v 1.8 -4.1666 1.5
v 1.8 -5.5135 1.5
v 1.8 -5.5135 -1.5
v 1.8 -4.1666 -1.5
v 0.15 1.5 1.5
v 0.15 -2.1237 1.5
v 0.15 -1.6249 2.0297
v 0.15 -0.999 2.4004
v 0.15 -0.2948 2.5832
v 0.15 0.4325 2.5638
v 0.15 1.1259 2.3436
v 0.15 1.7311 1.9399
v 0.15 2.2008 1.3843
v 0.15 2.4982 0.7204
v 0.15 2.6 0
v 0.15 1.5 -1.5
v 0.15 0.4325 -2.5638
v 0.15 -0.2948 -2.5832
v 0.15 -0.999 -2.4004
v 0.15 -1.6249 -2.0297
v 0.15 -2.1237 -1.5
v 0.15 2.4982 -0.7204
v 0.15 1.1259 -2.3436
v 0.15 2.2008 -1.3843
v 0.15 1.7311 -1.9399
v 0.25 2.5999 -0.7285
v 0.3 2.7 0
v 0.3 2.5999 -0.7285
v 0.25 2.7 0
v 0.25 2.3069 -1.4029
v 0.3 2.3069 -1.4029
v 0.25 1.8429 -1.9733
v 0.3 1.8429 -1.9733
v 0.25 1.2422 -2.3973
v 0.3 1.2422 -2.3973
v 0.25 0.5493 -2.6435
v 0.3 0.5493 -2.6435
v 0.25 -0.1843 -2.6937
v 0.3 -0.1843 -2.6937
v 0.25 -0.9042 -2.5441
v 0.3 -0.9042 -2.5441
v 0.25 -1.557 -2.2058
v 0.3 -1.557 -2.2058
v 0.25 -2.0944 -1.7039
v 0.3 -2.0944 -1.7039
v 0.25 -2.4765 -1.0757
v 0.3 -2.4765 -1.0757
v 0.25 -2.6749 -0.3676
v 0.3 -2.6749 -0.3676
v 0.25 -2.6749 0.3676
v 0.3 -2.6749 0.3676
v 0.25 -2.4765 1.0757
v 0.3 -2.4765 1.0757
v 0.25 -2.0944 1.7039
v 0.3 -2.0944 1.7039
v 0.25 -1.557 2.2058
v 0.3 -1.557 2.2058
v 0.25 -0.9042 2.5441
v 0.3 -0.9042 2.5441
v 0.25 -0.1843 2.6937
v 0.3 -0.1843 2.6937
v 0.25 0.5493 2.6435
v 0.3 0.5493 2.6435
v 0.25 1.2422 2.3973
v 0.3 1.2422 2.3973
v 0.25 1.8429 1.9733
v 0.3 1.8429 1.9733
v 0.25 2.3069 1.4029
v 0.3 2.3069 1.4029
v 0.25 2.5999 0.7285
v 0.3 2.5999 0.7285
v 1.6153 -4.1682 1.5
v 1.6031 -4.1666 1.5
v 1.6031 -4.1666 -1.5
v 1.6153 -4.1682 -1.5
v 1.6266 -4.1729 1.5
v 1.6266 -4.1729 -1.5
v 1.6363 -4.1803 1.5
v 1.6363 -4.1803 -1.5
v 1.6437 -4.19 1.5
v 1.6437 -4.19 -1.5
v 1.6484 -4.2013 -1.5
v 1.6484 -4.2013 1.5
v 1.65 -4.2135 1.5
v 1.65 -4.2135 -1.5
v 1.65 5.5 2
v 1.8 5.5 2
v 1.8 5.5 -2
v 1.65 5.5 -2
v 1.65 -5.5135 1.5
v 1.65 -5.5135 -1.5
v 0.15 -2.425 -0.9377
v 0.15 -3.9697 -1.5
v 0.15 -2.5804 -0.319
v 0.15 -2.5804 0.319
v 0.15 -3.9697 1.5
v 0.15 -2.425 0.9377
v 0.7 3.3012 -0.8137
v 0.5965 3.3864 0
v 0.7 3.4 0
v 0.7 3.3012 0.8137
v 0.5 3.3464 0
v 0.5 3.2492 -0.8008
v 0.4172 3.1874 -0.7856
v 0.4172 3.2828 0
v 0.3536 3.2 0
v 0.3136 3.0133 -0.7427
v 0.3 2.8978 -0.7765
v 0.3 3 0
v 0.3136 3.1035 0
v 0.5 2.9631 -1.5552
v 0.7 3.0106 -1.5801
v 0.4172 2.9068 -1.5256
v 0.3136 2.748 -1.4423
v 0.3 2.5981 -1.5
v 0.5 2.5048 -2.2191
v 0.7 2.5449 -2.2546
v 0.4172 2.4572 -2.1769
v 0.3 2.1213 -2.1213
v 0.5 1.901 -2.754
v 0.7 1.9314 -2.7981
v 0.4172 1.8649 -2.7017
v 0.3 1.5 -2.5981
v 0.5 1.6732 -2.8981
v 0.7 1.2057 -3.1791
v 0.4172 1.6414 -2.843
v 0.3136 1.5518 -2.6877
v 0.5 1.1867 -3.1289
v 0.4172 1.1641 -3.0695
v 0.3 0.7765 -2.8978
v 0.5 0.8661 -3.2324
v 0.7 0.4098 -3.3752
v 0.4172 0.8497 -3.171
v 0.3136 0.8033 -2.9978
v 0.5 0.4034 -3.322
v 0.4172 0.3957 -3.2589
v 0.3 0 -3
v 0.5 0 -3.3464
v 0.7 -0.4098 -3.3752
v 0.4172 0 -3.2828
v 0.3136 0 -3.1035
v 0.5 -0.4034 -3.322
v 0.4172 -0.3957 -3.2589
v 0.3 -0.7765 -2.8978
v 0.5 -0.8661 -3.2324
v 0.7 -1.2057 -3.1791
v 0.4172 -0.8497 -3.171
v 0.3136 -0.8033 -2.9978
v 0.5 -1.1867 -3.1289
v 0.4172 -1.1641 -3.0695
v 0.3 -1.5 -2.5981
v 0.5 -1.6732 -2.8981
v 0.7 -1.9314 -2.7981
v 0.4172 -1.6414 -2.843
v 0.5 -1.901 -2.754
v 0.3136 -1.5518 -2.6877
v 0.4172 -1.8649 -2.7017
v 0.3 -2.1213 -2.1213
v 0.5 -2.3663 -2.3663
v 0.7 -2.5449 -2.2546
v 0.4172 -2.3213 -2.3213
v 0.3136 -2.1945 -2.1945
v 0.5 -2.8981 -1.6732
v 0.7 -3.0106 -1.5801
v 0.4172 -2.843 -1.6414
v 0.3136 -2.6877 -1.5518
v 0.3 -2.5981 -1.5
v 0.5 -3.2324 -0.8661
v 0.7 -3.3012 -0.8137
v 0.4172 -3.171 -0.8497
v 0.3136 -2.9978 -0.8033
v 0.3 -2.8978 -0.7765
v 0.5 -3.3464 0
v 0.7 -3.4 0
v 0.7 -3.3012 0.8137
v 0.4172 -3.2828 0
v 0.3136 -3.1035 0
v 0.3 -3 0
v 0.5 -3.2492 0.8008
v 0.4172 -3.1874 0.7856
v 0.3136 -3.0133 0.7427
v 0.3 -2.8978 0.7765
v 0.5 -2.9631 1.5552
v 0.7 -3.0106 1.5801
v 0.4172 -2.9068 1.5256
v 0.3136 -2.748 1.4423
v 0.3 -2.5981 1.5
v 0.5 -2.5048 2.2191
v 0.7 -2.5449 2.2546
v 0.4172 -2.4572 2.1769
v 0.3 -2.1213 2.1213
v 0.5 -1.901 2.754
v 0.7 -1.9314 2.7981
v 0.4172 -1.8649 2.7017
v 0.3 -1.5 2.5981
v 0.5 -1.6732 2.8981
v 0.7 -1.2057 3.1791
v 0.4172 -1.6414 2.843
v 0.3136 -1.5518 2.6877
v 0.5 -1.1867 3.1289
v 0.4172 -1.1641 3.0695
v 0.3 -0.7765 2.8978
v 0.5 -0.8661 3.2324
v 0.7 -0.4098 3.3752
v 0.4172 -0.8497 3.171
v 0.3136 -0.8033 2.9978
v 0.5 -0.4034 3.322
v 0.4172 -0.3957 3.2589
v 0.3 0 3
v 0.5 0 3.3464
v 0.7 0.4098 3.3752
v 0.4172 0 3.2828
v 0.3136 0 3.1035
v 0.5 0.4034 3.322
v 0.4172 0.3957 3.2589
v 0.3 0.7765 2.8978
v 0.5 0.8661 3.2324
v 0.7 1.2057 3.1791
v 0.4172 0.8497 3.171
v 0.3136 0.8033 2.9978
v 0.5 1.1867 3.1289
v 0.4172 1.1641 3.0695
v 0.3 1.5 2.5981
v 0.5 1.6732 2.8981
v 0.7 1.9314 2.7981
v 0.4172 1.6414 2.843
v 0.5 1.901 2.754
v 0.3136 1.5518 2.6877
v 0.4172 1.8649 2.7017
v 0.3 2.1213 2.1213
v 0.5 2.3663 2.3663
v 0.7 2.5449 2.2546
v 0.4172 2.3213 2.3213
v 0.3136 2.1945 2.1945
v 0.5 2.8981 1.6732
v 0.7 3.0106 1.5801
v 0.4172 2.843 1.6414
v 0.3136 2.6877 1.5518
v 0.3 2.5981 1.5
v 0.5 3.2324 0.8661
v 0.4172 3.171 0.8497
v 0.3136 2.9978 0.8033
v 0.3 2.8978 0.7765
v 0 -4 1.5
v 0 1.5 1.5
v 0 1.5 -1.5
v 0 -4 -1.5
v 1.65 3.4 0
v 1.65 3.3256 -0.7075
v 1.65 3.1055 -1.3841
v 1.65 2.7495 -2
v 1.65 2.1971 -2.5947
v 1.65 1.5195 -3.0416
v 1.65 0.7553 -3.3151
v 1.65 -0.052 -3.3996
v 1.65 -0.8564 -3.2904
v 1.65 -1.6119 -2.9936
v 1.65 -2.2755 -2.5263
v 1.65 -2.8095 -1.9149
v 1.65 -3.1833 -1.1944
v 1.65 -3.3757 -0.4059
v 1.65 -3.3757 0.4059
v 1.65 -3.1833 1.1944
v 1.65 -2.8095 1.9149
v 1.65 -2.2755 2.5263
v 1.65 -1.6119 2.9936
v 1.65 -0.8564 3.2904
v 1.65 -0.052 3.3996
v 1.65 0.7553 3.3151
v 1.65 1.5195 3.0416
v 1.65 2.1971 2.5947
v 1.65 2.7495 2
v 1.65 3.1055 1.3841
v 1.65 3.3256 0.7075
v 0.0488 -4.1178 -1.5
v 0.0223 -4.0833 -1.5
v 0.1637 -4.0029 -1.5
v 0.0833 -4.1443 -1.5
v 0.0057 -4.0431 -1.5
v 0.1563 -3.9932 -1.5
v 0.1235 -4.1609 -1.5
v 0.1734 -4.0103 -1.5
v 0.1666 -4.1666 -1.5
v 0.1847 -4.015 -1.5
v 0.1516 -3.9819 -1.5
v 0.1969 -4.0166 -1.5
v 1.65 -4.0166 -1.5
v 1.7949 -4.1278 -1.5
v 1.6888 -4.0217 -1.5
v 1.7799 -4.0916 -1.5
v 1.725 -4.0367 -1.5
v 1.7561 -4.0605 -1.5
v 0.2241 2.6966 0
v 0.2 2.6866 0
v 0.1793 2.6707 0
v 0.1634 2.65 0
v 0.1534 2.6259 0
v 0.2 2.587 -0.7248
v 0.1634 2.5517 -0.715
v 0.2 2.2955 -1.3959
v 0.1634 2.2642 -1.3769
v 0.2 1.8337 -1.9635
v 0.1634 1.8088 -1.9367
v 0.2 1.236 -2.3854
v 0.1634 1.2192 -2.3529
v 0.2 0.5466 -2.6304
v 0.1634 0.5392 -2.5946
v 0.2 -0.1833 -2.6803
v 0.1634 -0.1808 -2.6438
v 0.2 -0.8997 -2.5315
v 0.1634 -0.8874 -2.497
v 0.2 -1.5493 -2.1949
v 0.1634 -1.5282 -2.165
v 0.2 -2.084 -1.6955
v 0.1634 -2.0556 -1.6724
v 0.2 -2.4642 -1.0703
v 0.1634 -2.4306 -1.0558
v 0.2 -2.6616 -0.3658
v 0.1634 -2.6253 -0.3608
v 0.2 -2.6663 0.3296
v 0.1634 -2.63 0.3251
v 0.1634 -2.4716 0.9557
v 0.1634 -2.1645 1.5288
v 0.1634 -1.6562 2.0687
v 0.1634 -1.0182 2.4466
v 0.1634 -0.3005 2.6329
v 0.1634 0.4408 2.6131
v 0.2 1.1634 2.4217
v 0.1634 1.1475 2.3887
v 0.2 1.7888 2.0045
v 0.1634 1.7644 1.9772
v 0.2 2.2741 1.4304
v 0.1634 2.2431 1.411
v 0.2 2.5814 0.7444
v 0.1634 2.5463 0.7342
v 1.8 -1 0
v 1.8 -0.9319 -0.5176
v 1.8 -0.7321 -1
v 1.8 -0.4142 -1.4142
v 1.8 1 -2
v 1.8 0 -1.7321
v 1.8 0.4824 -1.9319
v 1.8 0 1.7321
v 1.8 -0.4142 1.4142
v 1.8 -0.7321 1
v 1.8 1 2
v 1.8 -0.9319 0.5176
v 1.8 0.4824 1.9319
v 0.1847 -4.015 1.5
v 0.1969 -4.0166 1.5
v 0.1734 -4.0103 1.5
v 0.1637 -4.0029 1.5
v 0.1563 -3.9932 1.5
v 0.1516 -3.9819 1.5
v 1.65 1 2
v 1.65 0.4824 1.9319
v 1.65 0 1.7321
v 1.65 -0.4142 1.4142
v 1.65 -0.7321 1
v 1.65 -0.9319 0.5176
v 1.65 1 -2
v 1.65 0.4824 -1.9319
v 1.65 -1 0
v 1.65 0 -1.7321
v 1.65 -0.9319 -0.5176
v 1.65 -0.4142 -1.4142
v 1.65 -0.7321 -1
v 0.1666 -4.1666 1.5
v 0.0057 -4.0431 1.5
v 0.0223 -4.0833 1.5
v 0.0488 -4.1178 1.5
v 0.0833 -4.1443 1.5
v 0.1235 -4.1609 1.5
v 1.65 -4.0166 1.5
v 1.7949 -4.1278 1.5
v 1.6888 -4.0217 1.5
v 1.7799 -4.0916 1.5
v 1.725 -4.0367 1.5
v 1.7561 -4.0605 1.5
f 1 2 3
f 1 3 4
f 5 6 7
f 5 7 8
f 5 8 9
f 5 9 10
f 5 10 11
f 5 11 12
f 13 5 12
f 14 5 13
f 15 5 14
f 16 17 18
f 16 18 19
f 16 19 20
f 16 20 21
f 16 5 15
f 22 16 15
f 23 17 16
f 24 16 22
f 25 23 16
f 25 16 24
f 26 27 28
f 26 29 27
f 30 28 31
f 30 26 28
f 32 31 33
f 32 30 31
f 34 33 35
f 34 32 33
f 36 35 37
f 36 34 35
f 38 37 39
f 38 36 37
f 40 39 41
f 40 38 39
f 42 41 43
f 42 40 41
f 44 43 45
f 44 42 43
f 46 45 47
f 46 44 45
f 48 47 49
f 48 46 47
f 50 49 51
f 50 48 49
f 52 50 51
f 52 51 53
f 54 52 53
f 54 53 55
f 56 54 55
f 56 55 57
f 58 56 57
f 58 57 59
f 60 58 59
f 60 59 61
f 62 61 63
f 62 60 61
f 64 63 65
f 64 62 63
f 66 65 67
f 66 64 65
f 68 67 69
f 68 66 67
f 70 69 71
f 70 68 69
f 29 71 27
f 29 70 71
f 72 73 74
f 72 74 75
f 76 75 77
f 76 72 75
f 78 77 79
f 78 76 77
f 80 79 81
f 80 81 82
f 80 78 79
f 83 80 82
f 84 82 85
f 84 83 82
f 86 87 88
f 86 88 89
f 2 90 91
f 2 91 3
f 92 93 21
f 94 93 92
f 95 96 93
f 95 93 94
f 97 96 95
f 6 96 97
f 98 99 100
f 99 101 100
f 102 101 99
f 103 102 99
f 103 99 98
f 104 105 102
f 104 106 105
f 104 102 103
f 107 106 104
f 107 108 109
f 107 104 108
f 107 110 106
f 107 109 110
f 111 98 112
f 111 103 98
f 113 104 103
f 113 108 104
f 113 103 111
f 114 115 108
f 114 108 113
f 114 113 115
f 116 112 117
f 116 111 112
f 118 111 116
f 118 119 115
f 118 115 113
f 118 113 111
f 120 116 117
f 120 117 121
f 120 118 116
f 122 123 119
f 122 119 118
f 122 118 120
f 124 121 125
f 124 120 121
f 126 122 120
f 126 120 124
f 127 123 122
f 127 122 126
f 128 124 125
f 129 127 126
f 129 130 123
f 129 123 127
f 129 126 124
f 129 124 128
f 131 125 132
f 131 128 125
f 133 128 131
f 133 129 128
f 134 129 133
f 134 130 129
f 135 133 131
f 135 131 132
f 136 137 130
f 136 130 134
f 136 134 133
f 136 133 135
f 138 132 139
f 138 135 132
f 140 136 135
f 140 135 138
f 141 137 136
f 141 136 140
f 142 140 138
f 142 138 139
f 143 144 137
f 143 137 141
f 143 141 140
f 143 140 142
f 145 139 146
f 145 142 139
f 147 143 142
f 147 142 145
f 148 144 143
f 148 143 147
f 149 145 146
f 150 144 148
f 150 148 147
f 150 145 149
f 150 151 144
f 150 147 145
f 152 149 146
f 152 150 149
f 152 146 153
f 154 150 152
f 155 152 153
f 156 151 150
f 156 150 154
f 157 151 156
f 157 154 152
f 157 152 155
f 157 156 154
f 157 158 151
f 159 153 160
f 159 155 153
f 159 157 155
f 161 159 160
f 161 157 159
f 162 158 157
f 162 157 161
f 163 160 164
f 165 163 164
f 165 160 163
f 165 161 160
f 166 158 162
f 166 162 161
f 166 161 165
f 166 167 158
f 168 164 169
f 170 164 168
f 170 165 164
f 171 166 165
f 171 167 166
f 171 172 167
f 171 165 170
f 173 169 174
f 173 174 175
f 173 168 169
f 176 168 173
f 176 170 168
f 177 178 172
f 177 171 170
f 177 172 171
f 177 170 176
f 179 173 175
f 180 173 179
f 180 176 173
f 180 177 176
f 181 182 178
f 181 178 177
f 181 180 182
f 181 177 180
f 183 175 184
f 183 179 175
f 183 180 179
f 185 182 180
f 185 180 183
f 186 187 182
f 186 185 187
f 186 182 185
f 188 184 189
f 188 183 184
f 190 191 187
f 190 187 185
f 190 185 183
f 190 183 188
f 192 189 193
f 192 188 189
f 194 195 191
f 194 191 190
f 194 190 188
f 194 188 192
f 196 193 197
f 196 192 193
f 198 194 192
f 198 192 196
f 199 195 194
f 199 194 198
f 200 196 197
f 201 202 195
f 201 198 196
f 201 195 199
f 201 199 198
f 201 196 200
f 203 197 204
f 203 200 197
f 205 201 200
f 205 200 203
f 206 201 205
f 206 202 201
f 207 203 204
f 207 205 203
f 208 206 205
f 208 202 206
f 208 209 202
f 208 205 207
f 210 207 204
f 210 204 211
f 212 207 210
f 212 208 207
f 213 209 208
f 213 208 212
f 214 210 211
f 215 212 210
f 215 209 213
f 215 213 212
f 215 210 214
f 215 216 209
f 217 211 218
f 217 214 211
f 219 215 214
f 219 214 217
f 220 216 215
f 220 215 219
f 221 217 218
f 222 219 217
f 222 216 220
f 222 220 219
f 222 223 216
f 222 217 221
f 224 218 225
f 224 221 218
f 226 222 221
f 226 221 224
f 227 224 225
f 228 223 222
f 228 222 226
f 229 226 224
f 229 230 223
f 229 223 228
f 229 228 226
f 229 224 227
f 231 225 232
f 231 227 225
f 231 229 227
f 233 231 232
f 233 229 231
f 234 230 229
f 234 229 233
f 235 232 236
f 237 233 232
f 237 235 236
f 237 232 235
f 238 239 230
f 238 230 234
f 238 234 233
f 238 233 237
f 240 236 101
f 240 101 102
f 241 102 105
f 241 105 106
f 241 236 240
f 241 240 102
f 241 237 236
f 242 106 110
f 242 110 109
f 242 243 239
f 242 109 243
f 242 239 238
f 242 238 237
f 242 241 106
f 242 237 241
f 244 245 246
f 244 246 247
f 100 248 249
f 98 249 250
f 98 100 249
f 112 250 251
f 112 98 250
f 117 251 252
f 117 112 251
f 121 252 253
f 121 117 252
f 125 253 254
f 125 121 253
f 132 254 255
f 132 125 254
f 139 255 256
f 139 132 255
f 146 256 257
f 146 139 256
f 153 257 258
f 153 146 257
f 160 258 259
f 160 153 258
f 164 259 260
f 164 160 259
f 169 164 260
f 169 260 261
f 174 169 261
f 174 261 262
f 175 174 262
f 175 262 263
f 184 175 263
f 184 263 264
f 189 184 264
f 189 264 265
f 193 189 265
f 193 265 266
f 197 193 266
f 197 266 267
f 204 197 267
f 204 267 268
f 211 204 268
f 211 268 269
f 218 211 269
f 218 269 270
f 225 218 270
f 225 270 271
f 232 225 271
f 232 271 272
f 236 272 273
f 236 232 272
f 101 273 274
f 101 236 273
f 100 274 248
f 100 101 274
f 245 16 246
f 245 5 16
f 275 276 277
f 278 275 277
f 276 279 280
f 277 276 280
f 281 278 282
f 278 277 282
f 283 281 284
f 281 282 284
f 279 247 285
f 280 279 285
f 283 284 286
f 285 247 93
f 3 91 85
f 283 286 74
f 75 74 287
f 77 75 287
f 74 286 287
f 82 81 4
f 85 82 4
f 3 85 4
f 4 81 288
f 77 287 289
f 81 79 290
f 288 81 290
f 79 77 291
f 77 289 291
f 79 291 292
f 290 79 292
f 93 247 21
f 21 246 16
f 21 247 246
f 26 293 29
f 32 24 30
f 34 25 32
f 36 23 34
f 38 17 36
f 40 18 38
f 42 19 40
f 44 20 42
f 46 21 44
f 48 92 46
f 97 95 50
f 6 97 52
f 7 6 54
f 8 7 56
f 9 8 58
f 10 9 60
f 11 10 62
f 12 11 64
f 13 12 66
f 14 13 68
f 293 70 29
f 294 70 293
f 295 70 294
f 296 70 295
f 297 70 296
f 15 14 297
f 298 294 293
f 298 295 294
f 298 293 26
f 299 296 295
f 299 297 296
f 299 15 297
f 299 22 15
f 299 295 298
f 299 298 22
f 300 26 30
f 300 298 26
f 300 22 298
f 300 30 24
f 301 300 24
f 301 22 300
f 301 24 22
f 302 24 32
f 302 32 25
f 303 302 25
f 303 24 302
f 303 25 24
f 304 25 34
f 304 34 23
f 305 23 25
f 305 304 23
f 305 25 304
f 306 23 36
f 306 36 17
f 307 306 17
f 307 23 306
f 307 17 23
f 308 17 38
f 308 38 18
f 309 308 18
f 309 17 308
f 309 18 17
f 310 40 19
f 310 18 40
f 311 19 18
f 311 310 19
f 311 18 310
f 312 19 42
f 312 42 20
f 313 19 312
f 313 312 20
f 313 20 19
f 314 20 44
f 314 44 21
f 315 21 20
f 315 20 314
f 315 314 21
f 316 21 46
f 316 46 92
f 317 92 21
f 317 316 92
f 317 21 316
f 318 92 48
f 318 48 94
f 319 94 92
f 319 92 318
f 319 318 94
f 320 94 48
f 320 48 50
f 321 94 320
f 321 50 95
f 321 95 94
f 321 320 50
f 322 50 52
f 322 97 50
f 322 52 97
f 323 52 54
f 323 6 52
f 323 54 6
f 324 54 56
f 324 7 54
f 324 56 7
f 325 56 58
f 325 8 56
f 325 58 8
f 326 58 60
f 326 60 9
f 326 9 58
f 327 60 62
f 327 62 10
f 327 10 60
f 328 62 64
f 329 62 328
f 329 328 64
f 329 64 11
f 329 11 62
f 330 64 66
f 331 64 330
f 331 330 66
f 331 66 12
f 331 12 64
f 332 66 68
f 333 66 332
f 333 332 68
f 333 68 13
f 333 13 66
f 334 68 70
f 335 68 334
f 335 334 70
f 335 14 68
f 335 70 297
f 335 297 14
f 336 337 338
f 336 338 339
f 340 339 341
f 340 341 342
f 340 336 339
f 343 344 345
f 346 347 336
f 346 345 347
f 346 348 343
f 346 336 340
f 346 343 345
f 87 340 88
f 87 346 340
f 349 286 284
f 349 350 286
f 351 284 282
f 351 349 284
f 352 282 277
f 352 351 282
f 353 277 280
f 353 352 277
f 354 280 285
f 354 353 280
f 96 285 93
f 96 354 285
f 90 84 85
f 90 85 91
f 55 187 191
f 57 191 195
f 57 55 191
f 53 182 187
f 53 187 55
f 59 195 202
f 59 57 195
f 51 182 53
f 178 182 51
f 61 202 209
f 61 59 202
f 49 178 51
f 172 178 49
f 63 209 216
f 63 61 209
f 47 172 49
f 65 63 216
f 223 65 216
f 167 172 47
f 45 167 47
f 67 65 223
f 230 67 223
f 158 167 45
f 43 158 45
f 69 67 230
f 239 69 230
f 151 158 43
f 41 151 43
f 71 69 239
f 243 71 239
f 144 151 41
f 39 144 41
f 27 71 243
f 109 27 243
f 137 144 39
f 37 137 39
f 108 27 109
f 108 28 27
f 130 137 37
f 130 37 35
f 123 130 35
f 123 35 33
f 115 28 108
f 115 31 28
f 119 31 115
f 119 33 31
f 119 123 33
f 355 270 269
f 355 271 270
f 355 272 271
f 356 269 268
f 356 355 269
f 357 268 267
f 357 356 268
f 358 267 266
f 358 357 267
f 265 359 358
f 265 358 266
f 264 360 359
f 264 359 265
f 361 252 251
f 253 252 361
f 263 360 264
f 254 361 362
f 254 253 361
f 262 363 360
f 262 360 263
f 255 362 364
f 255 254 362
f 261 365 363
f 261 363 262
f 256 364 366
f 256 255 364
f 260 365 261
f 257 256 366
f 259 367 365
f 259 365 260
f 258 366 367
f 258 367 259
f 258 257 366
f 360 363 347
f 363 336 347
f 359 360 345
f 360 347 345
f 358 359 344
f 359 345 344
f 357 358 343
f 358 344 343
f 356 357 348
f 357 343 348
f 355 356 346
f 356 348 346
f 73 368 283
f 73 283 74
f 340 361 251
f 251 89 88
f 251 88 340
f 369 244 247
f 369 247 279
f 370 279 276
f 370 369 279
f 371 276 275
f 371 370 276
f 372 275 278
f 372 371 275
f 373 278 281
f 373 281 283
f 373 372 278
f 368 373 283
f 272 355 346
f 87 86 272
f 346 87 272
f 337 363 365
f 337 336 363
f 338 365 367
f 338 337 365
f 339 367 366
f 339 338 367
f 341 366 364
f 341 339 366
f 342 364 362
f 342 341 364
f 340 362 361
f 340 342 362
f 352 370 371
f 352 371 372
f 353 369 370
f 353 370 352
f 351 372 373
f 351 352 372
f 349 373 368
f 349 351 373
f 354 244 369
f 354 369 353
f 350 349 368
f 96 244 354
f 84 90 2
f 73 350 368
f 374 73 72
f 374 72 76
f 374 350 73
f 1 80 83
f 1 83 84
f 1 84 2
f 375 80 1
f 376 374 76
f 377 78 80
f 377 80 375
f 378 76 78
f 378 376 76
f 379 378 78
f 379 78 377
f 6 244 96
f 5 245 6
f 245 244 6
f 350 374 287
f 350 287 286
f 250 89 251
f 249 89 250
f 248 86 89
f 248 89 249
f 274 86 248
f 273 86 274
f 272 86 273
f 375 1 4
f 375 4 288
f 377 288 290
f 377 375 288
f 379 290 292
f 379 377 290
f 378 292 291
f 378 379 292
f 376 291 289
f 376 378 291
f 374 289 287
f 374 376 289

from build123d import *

# Parameters (mm, degrees)
F1_DEPTH      = 1.5
F1_DEPTH_BACK = 1.5
F4_DEPTH      = 2
F4_DEPTH_BACK = 2
F5_R          = 1.99999


# Not quite as in the source:
# - a fillet or chamfer is up to 0.001 mm smaller than in the source, because OpenCascade refuses the exact size


with BuildPart() as f1:
    # F0 (on Top) → F1 (new body, two sides)
    with BuildSketch(Plane.XY) as f1_sk:
        with BuildLine():
            Line((0.15, 1.5), (0, 1.5))
            Line((0, 1.5), (0, 0))
            Line((0, 0), (0, -4))
            ThreePointArc((0, -4), (0.0487994019, -4.1178121778), (0.1666115796, -4.1666115796))
            Line((0.1666115796, -4.1666115796), (1.6031347549, -4.1666115796))
            ThreePointArc((1.6031347549, -4.1666115796), (1.6362734875, -4.1803380921), (1.65, -4.2134768248))
            Line((1.65, -4.2134768248), (1.65, -5.5134768248))
            Line((1.65, -5.5134768248), (1.8, -5.5134768248))
            Line((1.8, -5.5134768248), (1.8, -4.1666115796))
            ThreePointArc((1.8, -4.1666115796), (1.7560660172, -4.0605455625), (1.65, -4.0166115796))
            Line((1.65, -4.0166115796), (0.1968652451, -4.0166115796))
            ThreePointArc((0.1968652451, -4.0166115796), (0.1637265125, -4.0028850671), (0.15, -3.9697463345))
            Line((0.15, -3.9697463345), (0.15, 0))
            Line((0.15, 0), (0.15, 1.5))
        make_face()
    extrude(amount=F1_DEPTH)
    extrude(f1_sk.sketch, amount=-F1_DEPTH_BACK)

    # F0 (on Top) → F2 (revolve)
    with BuildSketch(Plane.XY):
        with BuildLine():
            Line((0.15, 2.6), (0.15, 1.5))
            Line((0.15, 1.5), (0.15, 0))
            Line((0.15, 0), (0.3, 0))
            Line((0.3, 0), (0.3, 2.7))
            Line((0.3, 2.7), (0.25, 2.7))
            ThreePointArc((0.25, 2.7), (0.1792893219, 2.6707106781), (0.15, 2.6))
        make_face()
    revolve(axis=Axis((0.225, 0, 0), (-1, 0, 0)))

    # F0 (on Top) → F3 (revolve)
    with BuildSketch(Plane.XY):
        with BuildLine():
            Line((0.3, 2.7), (0.3, 0))
            Line((0.3, 0), (1.65, 0))
            Line((1.65, 0), (1.65, 3.4))
            Line((1.65, 3.4), (0.7, 3.4))
            ThreePointArc((0.7, 3.4), (0.4171572875, 3.2828427125), (0.3, 3))
            Line((0.3, 3), (0.3, 2.7))
        make_face()
    revolve(axis=Axis((0.975, 0, 0), (-1, 0, 0)))

    # F0 (on Top) → F4 (join, two sides)
    with BuildSketch(Plane.XY) as f4_sk:
        Polygon((1.65, 3.4), (1.65, 0), (1.65, -1), (1.8, -1), (1.8, 5.5), (1.65, 5.5), align=None)
    extrude(amount=F4_DEPTH)
    extrude(f4_sk.sketch, amount=-F4_DEPTH_BACK)

    # F5 (radius 2 in the source; OpenCascade refuses exactly that, so slightly less here)
    f5_edges = [f1.edges().sort_by_distance(p)[0] for p in [
        (1.725, -1, -2),
        (1.725, -1, 2),
    ]]
    fillet(f5_edges, radius=F5_R)


solid = f1.part
